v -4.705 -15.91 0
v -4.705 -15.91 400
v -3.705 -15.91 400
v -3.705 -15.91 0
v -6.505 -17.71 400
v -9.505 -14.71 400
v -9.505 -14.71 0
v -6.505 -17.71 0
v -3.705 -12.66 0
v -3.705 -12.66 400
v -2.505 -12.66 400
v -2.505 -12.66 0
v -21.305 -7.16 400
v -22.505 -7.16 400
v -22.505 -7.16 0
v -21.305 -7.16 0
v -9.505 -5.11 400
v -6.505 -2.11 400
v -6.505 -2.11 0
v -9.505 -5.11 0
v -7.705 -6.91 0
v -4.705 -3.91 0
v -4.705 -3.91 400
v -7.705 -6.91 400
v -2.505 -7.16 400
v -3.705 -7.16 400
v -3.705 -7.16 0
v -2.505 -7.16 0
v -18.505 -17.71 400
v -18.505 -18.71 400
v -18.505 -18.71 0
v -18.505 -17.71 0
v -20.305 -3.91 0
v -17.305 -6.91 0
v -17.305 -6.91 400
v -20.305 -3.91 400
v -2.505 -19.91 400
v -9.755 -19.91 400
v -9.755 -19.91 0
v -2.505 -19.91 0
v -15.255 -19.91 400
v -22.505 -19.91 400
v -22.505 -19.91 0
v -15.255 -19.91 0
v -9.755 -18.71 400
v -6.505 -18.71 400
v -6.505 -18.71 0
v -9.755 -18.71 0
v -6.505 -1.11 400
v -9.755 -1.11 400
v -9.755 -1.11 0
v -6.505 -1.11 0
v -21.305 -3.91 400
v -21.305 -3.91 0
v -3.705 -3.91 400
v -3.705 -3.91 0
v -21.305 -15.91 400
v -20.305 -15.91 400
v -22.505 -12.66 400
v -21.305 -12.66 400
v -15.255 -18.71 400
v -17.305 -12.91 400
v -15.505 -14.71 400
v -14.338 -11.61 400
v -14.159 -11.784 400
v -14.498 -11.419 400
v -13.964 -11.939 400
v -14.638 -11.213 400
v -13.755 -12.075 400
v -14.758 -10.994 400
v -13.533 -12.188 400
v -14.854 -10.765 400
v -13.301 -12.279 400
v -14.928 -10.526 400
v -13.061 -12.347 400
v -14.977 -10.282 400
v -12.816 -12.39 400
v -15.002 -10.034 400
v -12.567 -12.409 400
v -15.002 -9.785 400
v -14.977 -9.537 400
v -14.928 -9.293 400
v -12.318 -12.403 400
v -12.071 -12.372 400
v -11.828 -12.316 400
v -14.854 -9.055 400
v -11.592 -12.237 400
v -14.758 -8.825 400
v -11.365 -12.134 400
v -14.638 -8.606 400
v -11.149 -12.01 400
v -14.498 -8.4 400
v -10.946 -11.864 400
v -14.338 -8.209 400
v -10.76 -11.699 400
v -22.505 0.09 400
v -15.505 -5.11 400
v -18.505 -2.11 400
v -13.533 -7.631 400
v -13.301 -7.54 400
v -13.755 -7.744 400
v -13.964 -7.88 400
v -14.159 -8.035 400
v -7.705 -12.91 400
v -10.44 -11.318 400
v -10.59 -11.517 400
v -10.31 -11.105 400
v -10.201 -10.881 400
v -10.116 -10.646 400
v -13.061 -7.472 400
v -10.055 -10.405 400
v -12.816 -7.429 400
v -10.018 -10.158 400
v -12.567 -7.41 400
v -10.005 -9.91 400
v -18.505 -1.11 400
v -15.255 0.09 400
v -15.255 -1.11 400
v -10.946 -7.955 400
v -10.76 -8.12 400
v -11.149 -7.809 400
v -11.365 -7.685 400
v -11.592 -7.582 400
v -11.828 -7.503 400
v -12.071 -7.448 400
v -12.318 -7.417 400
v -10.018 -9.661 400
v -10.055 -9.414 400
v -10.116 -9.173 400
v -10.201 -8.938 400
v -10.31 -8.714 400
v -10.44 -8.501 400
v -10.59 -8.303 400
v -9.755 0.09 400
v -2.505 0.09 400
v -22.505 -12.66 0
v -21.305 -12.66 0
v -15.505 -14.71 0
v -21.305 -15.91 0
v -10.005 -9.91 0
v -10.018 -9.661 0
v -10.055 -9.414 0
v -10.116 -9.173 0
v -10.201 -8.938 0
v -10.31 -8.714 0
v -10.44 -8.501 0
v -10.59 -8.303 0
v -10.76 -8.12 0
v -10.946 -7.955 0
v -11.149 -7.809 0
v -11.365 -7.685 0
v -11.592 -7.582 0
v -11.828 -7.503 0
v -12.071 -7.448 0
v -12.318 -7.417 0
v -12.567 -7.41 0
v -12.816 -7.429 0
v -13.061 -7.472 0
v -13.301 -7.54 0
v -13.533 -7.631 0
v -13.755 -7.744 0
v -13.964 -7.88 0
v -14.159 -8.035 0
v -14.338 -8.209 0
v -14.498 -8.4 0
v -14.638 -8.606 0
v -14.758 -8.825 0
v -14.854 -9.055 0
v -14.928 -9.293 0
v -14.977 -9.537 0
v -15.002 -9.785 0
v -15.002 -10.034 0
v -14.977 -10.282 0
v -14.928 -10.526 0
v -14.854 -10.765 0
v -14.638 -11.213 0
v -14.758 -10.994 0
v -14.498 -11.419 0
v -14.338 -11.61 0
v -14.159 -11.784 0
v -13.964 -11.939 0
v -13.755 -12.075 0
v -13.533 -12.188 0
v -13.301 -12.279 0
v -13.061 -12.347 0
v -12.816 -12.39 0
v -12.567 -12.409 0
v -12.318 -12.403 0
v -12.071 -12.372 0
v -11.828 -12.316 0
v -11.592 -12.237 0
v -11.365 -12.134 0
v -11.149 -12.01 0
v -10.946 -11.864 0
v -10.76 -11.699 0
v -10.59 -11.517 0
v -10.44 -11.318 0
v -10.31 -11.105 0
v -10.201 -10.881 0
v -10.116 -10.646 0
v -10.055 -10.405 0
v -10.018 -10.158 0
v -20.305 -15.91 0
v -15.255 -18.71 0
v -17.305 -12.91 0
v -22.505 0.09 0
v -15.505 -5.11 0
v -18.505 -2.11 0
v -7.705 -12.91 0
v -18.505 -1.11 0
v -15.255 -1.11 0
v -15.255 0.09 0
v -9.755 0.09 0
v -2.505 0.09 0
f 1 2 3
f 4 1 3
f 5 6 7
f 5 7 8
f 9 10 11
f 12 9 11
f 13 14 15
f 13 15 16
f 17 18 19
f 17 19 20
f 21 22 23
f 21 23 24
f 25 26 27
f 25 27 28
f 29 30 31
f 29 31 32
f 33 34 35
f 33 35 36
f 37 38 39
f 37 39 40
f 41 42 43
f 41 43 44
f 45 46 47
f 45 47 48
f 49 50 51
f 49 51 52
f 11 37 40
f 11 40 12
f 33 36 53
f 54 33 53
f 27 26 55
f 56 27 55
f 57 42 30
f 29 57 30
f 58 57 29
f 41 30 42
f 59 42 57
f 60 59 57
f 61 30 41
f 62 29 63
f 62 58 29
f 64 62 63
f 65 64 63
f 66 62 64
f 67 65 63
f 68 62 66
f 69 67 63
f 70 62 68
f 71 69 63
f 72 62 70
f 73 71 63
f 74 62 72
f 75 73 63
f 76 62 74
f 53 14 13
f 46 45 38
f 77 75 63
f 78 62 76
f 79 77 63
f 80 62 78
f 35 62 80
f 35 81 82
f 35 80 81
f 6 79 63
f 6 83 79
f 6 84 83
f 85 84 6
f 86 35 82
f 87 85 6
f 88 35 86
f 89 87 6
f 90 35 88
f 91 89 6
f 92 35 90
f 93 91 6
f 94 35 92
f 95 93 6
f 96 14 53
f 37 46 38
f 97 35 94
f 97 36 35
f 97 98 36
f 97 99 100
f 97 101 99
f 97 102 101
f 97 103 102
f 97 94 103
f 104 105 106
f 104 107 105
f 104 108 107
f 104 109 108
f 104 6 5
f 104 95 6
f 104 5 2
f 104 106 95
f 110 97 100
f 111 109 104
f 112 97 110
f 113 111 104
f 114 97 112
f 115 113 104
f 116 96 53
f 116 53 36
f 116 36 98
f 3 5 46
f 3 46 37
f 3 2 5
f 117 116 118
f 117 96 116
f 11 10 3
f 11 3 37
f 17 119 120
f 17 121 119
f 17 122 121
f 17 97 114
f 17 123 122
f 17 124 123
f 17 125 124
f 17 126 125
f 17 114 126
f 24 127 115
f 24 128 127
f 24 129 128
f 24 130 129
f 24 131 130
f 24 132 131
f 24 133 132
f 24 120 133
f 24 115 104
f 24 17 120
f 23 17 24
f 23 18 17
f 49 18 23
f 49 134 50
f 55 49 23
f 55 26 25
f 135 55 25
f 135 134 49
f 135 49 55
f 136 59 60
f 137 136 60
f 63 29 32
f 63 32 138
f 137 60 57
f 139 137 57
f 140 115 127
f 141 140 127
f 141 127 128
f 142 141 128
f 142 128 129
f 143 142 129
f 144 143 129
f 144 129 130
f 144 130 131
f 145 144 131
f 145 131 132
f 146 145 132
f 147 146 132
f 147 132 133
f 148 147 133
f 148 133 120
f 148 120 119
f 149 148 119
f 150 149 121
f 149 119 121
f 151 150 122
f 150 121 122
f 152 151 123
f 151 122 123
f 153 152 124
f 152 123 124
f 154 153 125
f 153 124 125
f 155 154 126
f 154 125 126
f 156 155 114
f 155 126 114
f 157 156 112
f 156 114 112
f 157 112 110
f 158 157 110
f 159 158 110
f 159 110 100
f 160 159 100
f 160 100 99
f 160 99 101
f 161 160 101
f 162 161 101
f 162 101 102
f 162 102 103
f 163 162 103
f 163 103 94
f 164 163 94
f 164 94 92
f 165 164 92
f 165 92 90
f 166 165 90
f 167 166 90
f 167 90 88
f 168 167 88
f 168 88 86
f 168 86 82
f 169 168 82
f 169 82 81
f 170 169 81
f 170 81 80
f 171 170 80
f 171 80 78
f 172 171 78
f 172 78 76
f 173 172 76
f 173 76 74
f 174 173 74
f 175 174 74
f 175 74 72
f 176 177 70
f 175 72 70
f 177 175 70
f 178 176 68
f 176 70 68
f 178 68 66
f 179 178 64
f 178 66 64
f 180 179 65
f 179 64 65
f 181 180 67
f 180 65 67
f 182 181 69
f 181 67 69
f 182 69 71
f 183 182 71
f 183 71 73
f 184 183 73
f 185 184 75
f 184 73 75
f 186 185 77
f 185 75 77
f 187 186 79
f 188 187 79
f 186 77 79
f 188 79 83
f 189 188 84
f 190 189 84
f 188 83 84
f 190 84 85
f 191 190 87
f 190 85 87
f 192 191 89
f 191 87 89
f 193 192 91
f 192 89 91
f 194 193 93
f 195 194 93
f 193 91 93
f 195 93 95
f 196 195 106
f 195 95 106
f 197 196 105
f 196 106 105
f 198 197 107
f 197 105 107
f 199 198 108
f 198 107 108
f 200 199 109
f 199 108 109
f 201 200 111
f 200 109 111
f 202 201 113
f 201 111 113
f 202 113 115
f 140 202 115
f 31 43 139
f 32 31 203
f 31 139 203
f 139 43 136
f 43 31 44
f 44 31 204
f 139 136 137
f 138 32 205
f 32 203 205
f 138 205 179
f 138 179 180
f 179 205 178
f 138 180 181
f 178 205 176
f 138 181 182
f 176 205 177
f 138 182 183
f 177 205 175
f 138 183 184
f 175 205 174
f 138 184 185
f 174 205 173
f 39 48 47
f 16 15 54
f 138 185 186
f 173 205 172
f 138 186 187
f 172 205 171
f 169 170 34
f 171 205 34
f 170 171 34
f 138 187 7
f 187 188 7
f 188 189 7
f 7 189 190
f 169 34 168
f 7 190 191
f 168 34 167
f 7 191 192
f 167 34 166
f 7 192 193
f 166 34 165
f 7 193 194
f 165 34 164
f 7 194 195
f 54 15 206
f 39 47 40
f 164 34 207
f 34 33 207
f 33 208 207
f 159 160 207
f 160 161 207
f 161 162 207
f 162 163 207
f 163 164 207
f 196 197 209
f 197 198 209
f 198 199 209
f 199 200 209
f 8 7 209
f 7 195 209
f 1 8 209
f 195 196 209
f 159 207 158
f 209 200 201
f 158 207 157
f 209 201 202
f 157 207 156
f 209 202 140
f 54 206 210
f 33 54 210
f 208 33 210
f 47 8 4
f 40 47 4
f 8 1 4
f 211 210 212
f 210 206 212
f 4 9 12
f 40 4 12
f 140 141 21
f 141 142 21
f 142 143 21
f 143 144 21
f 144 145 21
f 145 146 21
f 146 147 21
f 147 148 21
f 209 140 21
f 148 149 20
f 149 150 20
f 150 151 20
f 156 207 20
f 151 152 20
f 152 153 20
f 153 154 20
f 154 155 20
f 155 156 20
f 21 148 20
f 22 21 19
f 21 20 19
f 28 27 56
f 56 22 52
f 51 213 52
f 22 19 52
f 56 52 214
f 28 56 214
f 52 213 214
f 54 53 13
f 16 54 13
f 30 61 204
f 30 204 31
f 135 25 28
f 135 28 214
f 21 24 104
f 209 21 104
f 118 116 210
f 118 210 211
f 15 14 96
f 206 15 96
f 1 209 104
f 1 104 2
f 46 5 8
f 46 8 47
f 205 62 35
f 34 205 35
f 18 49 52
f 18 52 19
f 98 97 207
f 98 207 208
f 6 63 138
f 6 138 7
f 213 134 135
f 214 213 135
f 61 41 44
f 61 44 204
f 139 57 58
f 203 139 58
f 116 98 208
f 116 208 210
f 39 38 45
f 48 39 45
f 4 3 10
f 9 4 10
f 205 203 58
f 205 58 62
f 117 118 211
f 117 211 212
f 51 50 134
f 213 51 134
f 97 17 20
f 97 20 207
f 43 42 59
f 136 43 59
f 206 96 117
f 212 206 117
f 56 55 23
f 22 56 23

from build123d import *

# Parameters (mm, degrees)
ESQUISSE1_W             = 20
ESQUISSE1_H             = 20
BOSS_EXTRU_1_DEPTH      = 400
ESQUISSE2_W             = 1.2
ESQUISSE2_H             = 5.5
ESQUISSE2_W_2           = 5.5
ESQUISSE2_H_2           = 1.2
ENL_V_MAT_EXTRU_1_DEPTH = 401
ENL_V_MAT_EXTRU_2_DEPTH = 401
ESQUISSE4_R             = 2.5
ENL_V_MAT_EXTRU_3_DEPTH = 401


with BuildPart() as part:
    # Esquisse1 → Boss.-Extru.1 (new body)
    with BuildSketch(Plane.XY):
        with Locations((-12.505109137, -9.909560068)):
            Rectangle(ESQUISSE1_W, ESQUISSE1_H)
    extrude(amount=BOSS_EXTRU_1_DEPTH)

    # Esquisse2 → Enlèv. mat.-Extru.1 (cut, through all)
    with BuildSketch(Plane.XY.offset(400)):
        with Locations((-21.905109137, -9.909560068)):
            Rectangle(ESQUISSE2_W, ESQUISSE2_H)
        with Locations((-12.505109137, -0.509560068)):
            Rectangle(ESQUISSE2_W_2, ESQUISSE2_H_2)
        with Locations((-3.105109137, -9.909560068)):
            Rectangle(ESQUISSE2_W, ESQUISSE2_H)
        with Locations((-12.505109137, -19.309560068)):
            Rectangle(ESQUISSE2_W_2, ESQUISSE2_H_2)
    extrude(amount=-ENL_V_MAT_EXTRU_1_DEPTH, mode=Mode.SUBTRACT)

    # Esquisse3 → Enlèv. mat.-Extru.2 (cut, through all)
    with BuildSketch(Plane.XY.offset(400)):
        Polygon((-21.305109137, -15.909560068), (-20.305109137, -15.909560068), (-17.305109137, -12.909560068), (-17.305109137, -6.909560068), (-20.305109137, -3.909560068), (-21.305109137, -3.909560068), align=None)
        Polygon((-18.505109137, -1.109560068), (-6.505109137, -1.109560068), (-6.505109137, -2.109560068), (-9.505109137, -5.109560068), (-15.505109137, -5.109560068), (-18.505109137, -2.109560068), align=None)
        Polygon((-3.705109137, -3.909560068), (-4.705109137, -3.909560068), (-7.705109137, -6.909560068), (-7.705109137, -12.909560068), (-4.705109137, -15.909560068), (-3.705109137, -15.909560068), align=None)
        Polygon((-6.505109137, -18.709560068), (-18.505109137, -18.709560068), (-18.505109137, -17.709560068), (-15.505109137, -14.709560068), (-9.505109137, -14.709560068), (-6.505109137, -17.709560068), align=None)
    extrude(amount=-ENL_V_MAT_EXTRU_2_DEPTH, mode=Mode.SUBTRACT)

    # Esquisse4 → Enlèv. mat.-Extru.3 (cut, through all)
    with BuildSketch(Plane.XY.offset(400)):
        with Locations((-12.505109137, -9.909560068)):
            Circle(ESQUISSE4_R)
    extrude(amount=-ENL_V_MAT_EXTRU_3_DEPTH, mode=Mode.SUBTRACT)


solid = part.part
